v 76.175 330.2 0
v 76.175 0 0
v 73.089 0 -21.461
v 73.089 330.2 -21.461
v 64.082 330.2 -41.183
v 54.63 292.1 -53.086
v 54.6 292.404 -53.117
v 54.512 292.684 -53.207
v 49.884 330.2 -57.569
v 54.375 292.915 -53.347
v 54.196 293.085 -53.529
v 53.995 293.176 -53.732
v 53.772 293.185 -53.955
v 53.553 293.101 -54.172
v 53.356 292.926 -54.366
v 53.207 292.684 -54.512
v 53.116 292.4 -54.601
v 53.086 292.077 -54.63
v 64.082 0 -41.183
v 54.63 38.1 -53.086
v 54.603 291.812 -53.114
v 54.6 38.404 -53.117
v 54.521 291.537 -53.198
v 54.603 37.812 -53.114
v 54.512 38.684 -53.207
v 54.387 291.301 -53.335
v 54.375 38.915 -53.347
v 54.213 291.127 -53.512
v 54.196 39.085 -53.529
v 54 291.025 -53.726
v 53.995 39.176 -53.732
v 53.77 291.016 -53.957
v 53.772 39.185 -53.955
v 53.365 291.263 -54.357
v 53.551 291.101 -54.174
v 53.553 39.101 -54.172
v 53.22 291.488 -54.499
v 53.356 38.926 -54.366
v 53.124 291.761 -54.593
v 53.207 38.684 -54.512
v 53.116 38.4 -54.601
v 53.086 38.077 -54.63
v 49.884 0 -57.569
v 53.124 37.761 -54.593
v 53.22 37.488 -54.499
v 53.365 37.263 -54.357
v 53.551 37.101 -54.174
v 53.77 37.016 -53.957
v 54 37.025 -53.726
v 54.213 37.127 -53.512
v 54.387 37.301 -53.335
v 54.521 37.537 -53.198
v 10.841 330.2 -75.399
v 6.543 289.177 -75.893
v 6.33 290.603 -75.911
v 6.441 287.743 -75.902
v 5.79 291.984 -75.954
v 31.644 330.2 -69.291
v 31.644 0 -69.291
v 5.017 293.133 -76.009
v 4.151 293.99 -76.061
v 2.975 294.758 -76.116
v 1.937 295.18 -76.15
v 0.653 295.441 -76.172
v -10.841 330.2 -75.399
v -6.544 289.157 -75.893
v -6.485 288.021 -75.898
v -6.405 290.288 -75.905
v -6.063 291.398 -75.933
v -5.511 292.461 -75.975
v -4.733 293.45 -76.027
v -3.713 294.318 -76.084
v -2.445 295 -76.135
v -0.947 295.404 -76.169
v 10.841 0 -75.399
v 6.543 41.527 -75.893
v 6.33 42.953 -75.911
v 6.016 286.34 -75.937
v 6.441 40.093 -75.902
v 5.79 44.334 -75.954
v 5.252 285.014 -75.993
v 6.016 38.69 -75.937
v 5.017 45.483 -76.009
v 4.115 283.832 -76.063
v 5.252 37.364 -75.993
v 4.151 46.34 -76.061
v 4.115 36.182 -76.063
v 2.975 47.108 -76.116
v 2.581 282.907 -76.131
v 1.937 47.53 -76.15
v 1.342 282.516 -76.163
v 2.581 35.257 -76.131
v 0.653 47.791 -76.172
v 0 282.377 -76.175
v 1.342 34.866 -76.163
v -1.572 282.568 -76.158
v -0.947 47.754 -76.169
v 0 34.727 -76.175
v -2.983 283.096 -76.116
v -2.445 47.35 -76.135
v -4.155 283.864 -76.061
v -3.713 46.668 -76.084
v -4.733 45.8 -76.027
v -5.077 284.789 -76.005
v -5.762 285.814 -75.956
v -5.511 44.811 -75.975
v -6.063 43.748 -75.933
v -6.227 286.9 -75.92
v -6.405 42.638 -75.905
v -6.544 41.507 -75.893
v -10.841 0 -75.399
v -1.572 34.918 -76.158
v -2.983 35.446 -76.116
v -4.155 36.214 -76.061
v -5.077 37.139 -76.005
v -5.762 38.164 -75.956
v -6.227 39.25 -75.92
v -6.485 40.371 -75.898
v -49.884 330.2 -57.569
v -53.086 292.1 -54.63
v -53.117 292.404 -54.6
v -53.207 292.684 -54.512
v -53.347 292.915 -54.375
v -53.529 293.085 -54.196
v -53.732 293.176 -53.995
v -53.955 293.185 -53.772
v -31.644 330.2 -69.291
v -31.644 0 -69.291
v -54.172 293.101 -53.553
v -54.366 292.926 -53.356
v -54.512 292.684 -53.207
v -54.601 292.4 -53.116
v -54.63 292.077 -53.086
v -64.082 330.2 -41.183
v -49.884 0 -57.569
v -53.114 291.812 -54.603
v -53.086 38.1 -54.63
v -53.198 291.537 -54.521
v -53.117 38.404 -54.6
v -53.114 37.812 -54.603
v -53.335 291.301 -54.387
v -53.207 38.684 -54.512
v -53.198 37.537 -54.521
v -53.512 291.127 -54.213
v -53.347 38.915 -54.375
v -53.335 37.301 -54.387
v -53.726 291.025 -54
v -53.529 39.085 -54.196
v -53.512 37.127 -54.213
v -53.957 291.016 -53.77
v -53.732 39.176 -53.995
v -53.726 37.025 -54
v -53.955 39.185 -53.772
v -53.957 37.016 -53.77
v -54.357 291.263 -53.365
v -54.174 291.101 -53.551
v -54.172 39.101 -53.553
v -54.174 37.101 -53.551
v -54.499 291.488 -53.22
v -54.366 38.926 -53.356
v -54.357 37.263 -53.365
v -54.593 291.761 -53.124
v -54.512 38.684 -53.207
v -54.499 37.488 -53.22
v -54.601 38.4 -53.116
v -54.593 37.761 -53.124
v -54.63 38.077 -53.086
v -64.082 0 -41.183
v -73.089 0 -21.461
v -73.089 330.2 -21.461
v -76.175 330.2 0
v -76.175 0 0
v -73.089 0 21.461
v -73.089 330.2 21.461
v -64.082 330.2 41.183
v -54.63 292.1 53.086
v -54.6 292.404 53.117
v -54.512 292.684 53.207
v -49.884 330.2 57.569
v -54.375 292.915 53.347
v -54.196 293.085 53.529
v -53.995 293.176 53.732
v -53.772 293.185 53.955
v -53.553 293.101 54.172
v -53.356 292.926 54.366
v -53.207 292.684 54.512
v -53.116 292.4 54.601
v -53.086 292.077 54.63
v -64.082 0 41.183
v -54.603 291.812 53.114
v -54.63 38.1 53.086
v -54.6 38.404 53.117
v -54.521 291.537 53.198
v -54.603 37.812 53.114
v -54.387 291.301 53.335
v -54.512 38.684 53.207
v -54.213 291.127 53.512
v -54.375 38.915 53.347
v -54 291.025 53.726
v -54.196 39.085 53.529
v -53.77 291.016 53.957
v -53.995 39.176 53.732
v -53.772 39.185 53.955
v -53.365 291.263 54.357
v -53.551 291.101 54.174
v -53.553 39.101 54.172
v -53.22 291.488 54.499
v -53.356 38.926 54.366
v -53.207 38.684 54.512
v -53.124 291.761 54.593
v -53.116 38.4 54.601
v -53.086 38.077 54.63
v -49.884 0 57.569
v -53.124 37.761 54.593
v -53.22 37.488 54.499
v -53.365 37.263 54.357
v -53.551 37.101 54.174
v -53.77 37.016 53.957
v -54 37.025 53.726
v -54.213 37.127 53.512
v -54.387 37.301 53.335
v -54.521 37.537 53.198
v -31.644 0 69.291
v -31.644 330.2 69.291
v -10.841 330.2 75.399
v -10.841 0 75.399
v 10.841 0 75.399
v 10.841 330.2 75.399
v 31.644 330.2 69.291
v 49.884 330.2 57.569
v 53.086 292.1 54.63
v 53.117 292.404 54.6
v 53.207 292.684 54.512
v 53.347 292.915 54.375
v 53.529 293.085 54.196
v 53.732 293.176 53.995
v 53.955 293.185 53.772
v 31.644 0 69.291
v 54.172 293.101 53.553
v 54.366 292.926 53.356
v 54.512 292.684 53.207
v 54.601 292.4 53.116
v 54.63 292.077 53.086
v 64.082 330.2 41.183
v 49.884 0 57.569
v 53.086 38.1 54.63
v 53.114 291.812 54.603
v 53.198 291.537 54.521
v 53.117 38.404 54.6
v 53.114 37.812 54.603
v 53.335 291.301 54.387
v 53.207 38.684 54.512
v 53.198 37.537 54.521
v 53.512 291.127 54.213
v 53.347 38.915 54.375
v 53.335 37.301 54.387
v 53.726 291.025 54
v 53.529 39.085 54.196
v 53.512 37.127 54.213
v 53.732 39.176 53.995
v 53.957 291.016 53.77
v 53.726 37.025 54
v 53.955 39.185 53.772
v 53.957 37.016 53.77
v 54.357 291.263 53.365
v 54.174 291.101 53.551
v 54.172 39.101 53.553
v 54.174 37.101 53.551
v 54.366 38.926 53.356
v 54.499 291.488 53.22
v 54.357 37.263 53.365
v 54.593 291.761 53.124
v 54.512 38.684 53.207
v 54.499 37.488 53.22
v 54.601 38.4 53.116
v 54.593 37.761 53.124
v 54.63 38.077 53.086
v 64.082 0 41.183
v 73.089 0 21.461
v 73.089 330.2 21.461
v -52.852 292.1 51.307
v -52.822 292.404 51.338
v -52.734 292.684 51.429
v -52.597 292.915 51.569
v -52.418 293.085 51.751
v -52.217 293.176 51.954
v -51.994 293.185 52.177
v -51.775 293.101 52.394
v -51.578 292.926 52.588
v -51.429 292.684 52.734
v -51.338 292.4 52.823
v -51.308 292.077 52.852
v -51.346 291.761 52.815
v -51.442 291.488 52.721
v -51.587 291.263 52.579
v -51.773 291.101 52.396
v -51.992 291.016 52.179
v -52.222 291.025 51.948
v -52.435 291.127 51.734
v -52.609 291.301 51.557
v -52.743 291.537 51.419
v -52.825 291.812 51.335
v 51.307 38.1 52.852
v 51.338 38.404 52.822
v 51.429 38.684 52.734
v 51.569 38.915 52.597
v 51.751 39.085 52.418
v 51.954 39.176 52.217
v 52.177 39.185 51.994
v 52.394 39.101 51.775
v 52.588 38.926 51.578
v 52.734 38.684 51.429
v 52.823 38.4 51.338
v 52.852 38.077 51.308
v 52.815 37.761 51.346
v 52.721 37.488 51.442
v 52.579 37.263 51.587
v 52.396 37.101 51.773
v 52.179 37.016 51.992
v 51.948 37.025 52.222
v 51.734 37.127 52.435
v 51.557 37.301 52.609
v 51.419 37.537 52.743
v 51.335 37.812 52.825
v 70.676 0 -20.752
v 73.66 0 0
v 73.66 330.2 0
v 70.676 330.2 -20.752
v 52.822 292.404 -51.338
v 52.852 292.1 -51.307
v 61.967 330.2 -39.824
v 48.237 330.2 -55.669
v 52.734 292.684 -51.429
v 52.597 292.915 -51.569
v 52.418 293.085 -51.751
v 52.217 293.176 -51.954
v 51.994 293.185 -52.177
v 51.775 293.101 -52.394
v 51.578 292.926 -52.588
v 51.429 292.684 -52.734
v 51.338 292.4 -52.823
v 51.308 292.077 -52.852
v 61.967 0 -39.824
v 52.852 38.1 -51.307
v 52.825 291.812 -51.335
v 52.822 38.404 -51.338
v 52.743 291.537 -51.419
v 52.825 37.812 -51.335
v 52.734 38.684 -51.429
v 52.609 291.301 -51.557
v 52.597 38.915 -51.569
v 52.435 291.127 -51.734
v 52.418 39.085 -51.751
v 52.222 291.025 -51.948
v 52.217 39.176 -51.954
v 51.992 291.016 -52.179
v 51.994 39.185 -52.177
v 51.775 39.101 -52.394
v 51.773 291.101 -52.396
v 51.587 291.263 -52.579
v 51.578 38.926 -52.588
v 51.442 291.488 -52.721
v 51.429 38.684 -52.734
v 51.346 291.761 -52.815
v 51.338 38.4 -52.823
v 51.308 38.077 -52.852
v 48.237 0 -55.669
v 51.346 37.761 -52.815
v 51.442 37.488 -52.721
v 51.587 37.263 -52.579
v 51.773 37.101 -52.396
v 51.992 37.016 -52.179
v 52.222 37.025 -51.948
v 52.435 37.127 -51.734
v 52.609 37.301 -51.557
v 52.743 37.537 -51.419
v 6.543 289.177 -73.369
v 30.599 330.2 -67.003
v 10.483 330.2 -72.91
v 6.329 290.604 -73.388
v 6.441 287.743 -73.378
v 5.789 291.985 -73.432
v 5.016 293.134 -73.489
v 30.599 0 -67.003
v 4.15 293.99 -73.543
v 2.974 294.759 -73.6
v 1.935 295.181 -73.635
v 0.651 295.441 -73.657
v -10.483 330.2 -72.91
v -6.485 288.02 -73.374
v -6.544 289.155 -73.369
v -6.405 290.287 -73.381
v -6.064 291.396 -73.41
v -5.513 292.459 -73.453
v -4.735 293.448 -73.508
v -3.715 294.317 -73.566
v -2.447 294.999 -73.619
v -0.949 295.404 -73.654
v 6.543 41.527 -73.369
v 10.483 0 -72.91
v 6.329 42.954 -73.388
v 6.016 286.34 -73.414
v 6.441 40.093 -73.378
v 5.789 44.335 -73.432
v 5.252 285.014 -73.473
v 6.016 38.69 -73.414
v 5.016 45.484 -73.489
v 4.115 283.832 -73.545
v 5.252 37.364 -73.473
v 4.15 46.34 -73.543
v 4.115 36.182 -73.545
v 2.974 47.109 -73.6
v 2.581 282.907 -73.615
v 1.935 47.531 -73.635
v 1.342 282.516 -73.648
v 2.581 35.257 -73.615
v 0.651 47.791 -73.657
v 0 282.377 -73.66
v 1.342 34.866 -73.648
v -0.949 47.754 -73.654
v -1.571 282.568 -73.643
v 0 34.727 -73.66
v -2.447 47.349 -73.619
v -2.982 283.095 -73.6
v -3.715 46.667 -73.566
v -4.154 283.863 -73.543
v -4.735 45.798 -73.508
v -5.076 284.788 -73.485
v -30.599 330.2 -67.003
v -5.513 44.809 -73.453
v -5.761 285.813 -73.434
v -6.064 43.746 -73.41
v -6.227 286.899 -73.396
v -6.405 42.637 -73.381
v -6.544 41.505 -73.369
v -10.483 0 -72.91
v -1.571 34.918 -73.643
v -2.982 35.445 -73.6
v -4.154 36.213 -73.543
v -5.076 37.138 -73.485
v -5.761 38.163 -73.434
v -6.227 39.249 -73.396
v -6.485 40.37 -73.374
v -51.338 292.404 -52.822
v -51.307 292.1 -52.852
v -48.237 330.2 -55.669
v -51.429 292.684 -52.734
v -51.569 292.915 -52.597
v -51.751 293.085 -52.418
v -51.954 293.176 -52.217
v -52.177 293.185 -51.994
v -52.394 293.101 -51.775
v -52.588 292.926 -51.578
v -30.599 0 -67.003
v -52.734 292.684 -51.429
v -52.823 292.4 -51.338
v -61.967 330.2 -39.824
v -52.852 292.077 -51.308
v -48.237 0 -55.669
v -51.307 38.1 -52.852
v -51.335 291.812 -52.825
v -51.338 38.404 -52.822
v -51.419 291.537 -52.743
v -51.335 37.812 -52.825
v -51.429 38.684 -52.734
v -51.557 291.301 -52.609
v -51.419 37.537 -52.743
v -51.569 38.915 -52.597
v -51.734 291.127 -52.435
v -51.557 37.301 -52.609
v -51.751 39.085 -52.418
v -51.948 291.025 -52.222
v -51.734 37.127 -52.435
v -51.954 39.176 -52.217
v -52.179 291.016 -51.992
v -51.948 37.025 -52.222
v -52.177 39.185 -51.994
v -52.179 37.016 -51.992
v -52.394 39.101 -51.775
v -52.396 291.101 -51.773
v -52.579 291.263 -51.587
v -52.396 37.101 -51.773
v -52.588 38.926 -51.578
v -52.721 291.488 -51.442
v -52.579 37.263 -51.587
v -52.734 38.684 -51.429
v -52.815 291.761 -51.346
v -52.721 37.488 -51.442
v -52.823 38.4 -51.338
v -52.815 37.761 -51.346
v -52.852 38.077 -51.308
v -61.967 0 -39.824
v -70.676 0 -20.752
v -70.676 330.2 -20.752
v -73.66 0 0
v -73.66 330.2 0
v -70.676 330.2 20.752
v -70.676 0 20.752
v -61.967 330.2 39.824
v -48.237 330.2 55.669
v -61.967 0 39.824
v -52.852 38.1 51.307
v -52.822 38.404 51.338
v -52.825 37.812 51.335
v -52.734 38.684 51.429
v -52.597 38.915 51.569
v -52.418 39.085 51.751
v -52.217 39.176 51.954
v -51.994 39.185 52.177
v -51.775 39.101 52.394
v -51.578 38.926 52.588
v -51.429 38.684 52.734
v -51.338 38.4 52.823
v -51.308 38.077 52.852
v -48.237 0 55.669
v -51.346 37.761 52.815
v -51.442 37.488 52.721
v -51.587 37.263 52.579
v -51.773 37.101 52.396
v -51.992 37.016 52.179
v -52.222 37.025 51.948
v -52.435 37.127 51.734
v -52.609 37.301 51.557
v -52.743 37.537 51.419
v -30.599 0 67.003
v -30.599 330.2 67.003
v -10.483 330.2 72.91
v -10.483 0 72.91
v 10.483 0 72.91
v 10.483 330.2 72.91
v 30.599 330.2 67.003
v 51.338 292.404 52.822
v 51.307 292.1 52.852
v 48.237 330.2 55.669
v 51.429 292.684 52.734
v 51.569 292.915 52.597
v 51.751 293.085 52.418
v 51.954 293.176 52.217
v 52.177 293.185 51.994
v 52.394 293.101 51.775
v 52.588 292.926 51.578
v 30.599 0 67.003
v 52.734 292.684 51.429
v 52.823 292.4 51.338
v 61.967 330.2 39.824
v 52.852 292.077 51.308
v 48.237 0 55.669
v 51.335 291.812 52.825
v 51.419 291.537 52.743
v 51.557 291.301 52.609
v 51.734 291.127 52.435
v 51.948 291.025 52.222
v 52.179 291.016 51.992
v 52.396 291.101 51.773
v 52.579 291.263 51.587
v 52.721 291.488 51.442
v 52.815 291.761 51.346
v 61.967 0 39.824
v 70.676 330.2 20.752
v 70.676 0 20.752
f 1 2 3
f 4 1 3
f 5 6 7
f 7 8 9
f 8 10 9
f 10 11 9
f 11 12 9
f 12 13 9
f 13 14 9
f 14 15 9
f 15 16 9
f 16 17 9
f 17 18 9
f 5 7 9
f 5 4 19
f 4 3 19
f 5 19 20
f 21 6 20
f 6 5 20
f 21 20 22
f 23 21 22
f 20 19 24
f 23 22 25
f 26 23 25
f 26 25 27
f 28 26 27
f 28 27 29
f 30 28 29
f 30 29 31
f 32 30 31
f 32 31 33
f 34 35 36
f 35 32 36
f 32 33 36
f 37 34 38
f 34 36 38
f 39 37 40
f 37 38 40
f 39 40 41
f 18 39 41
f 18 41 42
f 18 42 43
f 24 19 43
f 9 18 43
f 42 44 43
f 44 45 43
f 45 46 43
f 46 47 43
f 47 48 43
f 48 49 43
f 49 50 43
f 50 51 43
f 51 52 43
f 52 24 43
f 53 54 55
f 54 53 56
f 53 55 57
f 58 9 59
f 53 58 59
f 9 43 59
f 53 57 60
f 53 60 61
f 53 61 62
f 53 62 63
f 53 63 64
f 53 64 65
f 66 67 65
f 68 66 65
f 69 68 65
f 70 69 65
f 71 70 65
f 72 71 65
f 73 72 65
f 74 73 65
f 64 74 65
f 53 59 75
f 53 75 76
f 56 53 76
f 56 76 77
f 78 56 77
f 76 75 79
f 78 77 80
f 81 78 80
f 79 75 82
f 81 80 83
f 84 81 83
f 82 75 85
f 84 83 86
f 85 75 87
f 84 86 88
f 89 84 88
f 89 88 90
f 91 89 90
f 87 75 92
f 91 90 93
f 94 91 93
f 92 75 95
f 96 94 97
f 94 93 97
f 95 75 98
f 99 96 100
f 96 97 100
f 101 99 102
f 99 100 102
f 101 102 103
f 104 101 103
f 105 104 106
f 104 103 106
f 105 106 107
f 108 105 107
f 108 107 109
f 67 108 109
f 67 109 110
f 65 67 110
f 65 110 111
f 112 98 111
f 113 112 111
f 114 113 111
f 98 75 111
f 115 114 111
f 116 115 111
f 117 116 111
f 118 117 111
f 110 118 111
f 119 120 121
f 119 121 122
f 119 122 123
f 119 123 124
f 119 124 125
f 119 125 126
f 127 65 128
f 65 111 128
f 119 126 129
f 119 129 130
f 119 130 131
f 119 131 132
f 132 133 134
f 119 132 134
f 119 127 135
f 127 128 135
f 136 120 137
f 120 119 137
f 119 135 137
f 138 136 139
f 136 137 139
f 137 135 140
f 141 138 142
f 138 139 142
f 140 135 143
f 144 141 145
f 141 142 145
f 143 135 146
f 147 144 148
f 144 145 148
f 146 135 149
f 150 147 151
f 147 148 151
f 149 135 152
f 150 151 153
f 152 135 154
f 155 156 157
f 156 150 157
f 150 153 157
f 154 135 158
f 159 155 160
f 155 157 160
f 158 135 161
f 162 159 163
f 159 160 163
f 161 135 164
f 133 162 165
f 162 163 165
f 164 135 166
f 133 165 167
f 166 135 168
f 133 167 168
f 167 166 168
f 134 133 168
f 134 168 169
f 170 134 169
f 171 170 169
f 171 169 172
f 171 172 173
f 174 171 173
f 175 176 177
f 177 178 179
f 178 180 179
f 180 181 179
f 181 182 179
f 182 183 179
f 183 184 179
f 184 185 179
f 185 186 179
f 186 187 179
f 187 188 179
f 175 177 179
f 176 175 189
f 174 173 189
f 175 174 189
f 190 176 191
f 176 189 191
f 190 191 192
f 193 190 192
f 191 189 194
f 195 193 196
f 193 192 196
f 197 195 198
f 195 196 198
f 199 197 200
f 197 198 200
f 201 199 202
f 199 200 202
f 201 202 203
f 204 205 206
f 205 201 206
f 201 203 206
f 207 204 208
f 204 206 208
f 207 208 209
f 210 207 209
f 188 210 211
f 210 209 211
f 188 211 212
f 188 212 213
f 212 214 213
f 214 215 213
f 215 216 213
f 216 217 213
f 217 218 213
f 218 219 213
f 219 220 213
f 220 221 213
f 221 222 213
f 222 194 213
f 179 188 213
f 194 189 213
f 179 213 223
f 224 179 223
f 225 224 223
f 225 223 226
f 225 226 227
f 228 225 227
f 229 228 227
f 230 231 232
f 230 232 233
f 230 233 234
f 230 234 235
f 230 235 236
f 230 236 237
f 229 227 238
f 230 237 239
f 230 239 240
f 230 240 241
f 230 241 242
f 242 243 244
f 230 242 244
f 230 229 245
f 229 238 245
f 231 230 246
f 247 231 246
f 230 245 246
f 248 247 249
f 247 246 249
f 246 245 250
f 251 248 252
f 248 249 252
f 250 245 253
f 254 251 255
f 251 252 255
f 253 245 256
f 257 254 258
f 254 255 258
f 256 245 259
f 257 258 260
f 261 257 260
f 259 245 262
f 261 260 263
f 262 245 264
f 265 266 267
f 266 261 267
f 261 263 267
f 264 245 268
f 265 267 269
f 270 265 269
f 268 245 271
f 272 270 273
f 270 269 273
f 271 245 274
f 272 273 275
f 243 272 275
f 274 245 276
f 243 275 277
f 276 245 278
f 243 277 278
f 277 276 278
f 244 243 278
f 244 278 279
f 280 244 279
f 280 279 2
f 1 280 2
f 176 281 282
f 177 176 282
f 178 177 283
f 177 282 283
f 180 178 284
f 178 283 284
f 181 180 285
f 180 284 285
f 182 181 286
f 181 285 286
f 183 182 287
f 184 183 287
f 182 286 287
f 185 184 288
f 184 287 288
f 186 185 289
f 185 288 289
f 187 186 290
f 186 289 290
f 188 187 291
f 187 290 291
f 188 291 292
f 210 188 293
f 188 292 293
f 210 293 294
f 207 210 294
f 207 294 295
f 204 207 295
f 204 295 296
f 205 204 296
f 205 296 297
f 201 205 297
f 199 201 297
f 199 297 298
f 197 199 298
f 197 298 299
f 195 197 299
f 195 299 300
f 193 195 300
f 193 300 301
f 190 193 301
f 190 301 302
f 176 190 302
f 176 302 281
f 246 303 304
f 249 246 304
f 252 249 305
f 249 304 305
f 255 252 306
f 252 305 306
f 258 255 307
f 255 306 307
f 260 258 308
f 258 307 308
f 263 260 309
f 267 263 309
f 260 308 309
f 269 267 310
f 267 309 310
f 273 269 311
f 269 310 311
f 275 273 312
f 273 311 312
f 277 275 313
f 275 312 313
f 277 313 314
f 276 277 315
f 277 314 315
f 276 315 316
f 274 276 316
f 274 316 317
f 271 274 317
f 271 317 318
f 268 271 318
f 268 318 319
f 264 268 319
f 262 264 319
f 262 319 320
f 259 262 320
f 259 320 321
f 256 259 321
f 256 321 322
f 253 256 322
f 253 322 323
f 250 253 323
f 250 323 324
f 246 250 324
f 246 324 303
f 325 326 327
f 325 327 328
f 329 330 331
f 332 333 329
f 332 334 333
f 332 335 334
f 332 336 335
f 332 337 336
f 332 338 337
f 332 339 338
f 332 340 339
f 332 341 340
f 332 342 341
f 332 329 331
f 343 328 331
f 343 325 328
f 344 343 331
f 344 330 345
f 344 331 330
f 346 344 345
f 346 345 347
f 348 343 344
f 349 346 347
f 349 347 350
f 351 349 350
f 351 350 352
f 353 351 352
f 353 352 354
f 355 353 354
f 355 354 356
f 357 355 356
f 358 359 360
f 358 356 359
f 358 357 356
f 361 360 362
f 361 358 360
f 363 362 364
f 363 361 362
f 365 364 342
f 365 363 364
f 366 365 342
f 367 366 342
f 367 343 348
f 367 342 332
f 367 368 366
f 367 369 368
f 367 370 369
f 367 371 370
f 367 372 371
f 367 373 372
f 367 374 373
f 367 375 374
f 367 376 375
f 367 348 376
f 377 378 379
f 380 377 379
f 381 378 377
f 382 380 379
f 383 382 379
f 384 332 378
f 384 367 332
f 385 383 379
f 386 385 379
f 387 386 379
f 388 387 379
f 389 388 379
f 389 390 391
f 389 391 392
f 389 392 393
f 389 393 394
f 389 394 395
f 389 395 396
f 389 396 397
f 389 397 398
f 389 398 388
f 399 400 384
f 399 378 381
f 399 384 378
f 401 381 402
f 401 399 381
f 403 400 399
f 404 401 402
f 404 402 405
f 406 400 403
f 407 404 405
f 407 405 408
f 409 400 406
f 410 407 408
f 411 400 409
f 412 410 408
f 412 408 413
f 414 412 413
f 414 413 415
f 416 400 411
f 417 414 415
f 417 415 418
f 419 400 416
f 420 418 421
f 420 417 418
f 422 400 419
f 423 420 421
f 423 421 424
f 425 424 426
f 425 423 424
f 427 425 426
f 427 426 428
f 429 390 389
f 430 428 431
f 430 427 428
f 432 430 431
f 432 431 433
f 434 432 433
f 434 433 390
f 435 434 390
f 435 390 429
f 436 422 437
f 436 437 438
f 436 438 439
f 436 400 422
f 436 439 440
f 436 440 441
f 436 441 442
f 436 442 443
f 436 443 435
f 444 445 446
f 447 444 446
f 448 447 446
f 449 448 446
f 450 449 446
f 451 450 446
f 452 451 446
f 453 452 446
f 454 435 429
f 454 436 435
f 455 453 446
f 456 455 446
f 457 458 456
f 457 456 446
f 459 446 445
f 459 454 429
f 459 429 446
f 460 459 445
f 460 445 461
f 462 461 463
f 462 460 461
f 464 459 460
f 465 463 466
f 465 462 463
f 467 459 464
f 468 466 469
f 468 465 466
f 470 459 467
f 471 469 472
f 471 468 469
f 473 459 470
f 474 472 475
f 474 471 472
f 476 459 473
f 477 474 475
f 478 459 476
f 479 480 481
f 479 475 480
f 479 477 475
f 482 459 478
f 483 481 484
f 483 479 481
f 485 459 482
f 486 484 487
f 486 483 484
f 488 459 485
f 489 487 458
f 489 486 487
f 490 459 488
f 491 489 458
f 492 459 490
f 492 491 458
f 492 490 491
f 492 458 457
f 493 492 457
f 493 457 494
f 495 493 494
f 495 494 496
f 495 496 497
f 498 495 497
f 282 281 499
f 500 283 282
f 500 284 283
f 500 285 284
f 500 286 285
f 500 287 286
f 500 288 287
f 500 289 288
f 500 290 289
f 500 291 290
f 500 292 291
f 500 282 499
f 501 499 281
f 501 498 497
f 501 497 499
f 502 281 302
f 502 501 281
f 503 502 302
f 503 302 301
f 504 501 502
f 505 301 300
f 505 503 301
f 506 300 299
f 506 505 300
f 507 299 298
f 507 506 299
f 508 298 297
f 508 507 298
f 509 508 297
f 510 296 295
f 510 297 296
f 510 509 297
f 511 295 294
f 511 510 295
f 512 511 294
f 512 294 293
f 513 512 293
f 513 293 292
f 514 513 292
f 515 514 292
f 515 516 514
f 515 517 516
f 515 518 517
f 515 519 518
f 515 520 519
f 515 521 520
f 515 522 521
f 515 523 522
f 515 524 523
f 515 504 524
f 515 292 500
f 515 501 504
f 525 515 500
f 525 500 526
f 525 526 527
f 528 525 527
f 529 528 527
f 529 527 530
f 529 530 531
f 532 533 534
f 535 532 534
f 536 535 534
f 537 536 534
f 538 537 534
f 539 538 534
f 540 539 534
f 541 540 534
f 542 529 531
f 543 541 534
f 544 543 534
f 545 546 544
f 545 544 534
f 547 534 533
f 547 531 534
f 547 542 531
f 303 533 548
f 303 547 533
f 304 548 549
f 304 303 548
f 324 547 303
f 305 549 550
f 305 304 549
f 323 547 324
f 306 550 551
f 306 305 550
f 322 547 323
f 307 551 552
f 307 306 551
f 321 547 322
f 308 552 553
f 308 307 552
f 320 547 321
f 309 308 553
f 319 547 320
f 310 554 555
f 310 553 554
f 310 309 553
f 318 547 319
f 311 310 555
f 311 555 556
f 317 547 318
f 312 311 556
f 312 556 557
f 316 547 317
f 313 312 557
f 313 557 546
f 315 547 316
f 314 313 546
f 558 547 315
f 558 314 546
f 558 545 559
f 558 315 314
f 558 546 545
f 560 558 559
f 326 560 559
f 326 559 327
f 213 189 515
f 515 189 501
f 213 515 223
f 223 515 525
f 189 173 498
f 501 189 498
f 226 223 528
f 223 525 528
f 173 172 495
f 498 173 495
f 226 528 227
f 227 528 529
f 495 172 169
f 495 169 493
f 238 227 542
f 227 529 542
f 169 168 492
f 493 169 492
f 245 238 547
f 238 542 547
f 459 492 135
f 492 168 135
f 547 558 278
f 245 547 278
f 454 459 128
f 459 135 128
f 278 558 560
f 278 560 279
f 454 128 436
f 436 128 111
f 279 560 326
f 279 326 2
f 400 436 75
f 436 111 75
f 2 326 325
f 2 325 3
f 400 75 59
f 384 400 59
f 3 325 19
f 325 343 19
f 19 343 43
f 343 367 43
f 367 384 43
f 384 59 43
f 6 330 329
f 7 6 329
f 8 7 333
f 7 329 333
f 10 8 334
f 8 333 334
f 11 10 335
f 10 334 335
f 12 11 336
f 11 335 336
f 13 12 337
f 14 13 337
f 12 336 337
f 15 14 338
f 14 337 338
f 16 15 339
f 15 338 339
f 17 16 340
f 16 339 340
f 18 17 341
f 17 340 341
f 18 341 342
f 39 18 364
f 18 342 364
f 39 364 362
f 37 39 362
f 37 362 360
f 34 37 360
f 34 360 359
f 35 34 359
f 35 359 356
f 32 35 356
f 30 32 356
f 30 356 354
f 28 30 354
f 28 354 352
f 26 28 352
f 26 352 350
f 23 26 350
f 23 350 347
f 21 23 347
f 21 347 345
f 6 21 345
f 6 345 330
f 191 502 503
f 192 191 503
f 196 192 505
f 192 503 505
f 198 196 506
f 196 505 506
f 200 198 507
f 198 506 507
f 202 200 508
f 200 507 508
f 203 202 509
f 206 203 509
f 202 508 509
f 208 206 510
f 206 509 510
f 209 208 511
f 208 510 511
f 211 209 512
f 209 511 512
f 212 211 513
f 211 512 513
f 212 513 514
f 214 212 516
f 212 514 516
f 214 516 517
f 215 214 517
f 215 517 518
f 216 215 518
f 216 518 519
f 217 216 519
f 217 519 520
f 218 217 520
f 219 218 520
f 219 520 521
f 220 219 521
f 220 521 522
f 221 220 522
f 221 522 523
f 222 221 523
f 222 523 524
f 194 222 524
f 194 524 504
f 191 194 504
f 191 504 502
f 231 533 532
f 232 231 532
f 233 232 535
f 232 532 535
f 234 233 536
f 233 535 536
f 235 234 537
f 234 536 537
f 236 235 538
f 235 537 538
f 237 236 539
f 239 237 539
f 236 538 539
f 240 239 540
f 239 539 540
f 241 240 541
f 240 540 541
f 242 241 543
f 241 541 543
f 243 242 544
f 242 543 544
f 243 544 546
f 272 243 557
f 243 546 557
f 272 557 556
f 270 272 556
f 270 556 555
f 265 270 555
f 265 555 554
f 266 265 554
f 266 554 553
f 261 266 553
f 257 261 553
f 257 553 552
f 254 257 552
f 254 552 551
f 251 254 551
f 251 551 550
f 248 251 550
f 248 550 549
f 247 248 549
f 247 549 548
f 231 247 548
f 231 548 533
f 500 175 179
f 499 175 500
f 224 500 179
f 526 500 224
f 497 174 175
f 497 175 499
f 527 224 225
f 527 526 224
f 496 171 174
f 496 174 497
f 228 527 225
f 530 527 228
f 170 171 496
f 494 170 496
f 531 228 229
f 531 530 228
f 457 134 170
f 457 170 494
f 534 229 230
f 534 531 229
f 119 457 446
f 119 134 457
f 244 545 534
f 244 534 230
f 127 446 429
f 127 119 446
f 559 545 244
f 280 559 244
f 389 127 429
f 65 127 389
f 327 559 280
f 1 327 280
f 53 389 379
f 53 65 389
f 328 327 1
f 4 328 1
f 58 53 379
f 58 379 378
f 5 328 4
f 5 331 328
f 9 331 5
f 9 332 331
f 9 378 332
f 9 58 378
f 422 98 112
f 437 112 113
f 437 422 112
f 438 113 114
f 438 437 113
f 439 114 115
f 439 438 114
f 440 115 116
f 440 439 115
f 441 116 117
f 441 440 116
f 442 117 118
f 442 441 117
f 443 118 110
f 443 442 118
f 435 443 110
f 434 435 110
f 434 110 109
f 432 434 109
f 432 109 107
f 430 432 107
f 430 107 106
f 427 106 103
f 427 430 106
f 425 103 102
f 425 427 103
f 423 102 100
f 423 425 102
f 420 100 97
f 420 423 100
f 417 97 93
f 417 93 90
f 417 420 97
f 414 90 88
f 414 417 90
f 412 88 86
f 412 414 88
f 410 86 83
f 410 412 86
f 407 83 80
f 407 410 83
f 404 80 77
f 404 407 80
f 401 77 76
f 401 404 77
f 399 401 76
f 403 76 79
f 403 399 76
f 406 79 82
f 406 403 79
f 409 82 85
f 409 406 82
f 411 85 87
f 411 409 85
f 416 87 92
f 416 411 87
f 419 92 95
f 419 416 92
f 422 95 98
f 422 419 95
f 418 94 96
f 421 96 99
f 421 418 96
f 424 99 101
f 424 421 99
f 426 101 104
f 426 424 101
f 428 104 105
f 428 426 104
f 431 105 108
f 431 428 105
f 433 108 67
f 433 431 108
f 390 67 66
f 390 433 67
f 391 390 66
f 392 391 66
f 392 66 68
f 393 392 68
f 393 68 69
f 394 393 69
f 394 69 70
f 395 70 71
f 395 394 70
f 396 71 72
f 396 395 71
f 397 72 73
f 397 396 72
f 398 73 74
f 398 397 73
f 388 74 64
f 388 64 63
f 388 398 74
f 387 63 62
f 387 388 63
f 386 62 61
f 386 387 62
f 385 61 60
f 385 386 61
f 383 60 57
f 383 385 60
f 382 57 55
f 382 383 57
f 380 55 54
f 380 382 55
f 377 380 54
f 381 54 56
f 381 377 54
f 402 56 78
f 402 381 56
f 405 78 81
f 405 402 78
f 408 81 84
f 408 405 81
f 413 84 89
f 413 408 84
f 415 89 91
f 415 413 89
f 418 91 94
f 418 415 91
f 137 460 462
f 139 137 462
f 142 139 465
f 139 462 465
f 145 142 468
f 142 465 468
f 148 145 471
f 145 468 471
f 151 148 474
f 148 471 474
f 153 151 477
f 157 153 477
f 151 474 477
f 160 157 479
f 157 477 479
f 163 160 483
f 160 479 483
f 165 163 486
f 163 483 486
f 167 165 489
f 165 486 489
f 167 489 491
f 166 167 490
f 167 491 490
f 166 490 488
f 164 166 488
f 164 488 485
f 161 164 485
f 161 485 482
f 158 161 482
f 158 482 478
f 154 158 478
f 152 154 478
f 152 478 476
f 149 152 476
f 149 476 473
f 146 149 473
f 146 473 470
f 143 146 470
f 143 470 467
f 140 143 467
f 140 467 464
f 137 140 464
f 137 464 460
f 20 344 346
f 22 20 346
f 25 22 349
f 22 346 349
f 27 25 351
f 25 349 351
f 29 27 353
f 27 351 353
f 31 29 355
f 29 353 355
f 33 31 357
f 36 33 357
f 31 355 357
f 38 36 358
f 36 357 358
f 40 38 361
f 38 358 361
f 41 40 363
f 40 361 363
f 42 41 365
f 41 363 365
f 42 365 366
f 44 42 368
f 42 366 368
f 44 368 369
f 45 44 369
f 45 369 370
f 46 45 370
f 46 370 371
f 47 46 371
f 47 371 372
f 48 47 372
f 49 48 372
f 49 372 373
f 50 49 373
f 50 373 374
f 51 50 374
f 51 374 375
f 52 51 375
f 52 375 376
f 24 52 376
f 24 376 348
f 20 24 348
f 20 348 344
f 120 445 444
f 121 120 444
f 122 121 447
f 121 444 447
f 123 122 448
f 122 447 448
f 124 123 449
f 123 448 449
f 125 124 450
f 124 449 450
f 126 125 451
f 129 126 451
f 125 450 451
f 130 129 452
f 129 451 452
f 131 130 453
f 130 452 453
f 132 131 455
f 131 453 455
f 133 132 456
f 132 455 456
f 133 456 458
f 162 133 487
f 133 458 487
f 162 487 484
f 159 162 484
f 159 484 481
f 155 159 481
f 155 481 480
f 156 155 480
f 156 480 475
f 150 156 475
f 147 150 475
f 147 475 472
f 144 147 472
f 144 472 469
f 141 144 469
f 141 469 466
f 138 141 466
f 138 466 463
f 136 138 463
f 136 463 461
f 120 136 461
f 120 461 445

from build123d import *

# Parameters (mm, degrees)
SKETCH1_R           = 76.1746
SKETCH1_R_2         = 73.66
BOSS_EXTRUDE1_DEPTH = 330.2
SKETCH23_R          = 1.0922
SHEAR_SCRREWS_DEPTH = 108.72715257
CIRPATTERN1_COUNT   = 4


with BuildPart() as part:
    # Sketch1 → Boss-Extrude1 (new body)
    with BuildSketch(Plane(origin=(0, 0, 0), x_dir=(1, 0, 0), z_dir=(0, 1, 0))):
        Circle(SKETCH1_R)
        Circle(SKETCH1_R_2, mode=Mode.SUBTRACT)
    extrude(amount=BOSS_EXTRUDE1_DEPTH)

    # Sketch17 → 1/2 Clearance Hole5 (revolve, cut)
    with BuildSketch(Plane(origin=(0, 288.925, 0), x_dir=(0, -1, 0), z_dir=(1, 0, 0))):
        Polygon((0, 0), (0, 80.134507437), (6.54812, 76.2), (6.54812, 0), align=None)
    revolve(axis=Axis((0, 288.925, 6.35), (0, 0, -1)), mode=Mode.SUBTRACT)

    # Sketch21 → 1/2 Clearance Hole7 (revolve, cut)
    with BuildSketch(Plane(origin=(0, 41.275, 0), x_dir=(0, -1, 0), z_dir=(1, 0, 0))):
        Polygon((0, 0), (0, 80.134507437), (6.54812, 76.2), (6.54812, 0), align=None)
    revolve(axis=Axis((0, 41.275, 6.35), (0, 0, -1)), mode=Mode.SUBTRACT)

    # Sketch23 → Shear Scrrews (cut, through all)
    with BuildSketch(Plane(origin=(0, 0, 0), x_dir=(0.707106781, 0, 0.707106781), z_dir=(-0.707106781, 0, 0.707106781))):
        with Locations((0, 292.1)):
            Circle(SKETCH23_R)
        with Locations((0, 38.1)):
            Circle(SKETCH23_R)
    shear_scrrews = extrude(amount=-SHEAR_SCRREWS_DEPTH, mode=Mode.SUBTRACT)

    # CirPattern1: Shear Scrrews ×4 about axis
    cirpattern1_axis = Axis((0, 330.2, 0), (0, -1, 0))
    for i in range(1, CIRPATTERN1_COUNT):
        add(shear_scrrews.rotate(cirpattern1_axis, i * 360 / CIRPATTERN1_COUNT), mode=Mode.SUBTRACT)


solid = part.part
